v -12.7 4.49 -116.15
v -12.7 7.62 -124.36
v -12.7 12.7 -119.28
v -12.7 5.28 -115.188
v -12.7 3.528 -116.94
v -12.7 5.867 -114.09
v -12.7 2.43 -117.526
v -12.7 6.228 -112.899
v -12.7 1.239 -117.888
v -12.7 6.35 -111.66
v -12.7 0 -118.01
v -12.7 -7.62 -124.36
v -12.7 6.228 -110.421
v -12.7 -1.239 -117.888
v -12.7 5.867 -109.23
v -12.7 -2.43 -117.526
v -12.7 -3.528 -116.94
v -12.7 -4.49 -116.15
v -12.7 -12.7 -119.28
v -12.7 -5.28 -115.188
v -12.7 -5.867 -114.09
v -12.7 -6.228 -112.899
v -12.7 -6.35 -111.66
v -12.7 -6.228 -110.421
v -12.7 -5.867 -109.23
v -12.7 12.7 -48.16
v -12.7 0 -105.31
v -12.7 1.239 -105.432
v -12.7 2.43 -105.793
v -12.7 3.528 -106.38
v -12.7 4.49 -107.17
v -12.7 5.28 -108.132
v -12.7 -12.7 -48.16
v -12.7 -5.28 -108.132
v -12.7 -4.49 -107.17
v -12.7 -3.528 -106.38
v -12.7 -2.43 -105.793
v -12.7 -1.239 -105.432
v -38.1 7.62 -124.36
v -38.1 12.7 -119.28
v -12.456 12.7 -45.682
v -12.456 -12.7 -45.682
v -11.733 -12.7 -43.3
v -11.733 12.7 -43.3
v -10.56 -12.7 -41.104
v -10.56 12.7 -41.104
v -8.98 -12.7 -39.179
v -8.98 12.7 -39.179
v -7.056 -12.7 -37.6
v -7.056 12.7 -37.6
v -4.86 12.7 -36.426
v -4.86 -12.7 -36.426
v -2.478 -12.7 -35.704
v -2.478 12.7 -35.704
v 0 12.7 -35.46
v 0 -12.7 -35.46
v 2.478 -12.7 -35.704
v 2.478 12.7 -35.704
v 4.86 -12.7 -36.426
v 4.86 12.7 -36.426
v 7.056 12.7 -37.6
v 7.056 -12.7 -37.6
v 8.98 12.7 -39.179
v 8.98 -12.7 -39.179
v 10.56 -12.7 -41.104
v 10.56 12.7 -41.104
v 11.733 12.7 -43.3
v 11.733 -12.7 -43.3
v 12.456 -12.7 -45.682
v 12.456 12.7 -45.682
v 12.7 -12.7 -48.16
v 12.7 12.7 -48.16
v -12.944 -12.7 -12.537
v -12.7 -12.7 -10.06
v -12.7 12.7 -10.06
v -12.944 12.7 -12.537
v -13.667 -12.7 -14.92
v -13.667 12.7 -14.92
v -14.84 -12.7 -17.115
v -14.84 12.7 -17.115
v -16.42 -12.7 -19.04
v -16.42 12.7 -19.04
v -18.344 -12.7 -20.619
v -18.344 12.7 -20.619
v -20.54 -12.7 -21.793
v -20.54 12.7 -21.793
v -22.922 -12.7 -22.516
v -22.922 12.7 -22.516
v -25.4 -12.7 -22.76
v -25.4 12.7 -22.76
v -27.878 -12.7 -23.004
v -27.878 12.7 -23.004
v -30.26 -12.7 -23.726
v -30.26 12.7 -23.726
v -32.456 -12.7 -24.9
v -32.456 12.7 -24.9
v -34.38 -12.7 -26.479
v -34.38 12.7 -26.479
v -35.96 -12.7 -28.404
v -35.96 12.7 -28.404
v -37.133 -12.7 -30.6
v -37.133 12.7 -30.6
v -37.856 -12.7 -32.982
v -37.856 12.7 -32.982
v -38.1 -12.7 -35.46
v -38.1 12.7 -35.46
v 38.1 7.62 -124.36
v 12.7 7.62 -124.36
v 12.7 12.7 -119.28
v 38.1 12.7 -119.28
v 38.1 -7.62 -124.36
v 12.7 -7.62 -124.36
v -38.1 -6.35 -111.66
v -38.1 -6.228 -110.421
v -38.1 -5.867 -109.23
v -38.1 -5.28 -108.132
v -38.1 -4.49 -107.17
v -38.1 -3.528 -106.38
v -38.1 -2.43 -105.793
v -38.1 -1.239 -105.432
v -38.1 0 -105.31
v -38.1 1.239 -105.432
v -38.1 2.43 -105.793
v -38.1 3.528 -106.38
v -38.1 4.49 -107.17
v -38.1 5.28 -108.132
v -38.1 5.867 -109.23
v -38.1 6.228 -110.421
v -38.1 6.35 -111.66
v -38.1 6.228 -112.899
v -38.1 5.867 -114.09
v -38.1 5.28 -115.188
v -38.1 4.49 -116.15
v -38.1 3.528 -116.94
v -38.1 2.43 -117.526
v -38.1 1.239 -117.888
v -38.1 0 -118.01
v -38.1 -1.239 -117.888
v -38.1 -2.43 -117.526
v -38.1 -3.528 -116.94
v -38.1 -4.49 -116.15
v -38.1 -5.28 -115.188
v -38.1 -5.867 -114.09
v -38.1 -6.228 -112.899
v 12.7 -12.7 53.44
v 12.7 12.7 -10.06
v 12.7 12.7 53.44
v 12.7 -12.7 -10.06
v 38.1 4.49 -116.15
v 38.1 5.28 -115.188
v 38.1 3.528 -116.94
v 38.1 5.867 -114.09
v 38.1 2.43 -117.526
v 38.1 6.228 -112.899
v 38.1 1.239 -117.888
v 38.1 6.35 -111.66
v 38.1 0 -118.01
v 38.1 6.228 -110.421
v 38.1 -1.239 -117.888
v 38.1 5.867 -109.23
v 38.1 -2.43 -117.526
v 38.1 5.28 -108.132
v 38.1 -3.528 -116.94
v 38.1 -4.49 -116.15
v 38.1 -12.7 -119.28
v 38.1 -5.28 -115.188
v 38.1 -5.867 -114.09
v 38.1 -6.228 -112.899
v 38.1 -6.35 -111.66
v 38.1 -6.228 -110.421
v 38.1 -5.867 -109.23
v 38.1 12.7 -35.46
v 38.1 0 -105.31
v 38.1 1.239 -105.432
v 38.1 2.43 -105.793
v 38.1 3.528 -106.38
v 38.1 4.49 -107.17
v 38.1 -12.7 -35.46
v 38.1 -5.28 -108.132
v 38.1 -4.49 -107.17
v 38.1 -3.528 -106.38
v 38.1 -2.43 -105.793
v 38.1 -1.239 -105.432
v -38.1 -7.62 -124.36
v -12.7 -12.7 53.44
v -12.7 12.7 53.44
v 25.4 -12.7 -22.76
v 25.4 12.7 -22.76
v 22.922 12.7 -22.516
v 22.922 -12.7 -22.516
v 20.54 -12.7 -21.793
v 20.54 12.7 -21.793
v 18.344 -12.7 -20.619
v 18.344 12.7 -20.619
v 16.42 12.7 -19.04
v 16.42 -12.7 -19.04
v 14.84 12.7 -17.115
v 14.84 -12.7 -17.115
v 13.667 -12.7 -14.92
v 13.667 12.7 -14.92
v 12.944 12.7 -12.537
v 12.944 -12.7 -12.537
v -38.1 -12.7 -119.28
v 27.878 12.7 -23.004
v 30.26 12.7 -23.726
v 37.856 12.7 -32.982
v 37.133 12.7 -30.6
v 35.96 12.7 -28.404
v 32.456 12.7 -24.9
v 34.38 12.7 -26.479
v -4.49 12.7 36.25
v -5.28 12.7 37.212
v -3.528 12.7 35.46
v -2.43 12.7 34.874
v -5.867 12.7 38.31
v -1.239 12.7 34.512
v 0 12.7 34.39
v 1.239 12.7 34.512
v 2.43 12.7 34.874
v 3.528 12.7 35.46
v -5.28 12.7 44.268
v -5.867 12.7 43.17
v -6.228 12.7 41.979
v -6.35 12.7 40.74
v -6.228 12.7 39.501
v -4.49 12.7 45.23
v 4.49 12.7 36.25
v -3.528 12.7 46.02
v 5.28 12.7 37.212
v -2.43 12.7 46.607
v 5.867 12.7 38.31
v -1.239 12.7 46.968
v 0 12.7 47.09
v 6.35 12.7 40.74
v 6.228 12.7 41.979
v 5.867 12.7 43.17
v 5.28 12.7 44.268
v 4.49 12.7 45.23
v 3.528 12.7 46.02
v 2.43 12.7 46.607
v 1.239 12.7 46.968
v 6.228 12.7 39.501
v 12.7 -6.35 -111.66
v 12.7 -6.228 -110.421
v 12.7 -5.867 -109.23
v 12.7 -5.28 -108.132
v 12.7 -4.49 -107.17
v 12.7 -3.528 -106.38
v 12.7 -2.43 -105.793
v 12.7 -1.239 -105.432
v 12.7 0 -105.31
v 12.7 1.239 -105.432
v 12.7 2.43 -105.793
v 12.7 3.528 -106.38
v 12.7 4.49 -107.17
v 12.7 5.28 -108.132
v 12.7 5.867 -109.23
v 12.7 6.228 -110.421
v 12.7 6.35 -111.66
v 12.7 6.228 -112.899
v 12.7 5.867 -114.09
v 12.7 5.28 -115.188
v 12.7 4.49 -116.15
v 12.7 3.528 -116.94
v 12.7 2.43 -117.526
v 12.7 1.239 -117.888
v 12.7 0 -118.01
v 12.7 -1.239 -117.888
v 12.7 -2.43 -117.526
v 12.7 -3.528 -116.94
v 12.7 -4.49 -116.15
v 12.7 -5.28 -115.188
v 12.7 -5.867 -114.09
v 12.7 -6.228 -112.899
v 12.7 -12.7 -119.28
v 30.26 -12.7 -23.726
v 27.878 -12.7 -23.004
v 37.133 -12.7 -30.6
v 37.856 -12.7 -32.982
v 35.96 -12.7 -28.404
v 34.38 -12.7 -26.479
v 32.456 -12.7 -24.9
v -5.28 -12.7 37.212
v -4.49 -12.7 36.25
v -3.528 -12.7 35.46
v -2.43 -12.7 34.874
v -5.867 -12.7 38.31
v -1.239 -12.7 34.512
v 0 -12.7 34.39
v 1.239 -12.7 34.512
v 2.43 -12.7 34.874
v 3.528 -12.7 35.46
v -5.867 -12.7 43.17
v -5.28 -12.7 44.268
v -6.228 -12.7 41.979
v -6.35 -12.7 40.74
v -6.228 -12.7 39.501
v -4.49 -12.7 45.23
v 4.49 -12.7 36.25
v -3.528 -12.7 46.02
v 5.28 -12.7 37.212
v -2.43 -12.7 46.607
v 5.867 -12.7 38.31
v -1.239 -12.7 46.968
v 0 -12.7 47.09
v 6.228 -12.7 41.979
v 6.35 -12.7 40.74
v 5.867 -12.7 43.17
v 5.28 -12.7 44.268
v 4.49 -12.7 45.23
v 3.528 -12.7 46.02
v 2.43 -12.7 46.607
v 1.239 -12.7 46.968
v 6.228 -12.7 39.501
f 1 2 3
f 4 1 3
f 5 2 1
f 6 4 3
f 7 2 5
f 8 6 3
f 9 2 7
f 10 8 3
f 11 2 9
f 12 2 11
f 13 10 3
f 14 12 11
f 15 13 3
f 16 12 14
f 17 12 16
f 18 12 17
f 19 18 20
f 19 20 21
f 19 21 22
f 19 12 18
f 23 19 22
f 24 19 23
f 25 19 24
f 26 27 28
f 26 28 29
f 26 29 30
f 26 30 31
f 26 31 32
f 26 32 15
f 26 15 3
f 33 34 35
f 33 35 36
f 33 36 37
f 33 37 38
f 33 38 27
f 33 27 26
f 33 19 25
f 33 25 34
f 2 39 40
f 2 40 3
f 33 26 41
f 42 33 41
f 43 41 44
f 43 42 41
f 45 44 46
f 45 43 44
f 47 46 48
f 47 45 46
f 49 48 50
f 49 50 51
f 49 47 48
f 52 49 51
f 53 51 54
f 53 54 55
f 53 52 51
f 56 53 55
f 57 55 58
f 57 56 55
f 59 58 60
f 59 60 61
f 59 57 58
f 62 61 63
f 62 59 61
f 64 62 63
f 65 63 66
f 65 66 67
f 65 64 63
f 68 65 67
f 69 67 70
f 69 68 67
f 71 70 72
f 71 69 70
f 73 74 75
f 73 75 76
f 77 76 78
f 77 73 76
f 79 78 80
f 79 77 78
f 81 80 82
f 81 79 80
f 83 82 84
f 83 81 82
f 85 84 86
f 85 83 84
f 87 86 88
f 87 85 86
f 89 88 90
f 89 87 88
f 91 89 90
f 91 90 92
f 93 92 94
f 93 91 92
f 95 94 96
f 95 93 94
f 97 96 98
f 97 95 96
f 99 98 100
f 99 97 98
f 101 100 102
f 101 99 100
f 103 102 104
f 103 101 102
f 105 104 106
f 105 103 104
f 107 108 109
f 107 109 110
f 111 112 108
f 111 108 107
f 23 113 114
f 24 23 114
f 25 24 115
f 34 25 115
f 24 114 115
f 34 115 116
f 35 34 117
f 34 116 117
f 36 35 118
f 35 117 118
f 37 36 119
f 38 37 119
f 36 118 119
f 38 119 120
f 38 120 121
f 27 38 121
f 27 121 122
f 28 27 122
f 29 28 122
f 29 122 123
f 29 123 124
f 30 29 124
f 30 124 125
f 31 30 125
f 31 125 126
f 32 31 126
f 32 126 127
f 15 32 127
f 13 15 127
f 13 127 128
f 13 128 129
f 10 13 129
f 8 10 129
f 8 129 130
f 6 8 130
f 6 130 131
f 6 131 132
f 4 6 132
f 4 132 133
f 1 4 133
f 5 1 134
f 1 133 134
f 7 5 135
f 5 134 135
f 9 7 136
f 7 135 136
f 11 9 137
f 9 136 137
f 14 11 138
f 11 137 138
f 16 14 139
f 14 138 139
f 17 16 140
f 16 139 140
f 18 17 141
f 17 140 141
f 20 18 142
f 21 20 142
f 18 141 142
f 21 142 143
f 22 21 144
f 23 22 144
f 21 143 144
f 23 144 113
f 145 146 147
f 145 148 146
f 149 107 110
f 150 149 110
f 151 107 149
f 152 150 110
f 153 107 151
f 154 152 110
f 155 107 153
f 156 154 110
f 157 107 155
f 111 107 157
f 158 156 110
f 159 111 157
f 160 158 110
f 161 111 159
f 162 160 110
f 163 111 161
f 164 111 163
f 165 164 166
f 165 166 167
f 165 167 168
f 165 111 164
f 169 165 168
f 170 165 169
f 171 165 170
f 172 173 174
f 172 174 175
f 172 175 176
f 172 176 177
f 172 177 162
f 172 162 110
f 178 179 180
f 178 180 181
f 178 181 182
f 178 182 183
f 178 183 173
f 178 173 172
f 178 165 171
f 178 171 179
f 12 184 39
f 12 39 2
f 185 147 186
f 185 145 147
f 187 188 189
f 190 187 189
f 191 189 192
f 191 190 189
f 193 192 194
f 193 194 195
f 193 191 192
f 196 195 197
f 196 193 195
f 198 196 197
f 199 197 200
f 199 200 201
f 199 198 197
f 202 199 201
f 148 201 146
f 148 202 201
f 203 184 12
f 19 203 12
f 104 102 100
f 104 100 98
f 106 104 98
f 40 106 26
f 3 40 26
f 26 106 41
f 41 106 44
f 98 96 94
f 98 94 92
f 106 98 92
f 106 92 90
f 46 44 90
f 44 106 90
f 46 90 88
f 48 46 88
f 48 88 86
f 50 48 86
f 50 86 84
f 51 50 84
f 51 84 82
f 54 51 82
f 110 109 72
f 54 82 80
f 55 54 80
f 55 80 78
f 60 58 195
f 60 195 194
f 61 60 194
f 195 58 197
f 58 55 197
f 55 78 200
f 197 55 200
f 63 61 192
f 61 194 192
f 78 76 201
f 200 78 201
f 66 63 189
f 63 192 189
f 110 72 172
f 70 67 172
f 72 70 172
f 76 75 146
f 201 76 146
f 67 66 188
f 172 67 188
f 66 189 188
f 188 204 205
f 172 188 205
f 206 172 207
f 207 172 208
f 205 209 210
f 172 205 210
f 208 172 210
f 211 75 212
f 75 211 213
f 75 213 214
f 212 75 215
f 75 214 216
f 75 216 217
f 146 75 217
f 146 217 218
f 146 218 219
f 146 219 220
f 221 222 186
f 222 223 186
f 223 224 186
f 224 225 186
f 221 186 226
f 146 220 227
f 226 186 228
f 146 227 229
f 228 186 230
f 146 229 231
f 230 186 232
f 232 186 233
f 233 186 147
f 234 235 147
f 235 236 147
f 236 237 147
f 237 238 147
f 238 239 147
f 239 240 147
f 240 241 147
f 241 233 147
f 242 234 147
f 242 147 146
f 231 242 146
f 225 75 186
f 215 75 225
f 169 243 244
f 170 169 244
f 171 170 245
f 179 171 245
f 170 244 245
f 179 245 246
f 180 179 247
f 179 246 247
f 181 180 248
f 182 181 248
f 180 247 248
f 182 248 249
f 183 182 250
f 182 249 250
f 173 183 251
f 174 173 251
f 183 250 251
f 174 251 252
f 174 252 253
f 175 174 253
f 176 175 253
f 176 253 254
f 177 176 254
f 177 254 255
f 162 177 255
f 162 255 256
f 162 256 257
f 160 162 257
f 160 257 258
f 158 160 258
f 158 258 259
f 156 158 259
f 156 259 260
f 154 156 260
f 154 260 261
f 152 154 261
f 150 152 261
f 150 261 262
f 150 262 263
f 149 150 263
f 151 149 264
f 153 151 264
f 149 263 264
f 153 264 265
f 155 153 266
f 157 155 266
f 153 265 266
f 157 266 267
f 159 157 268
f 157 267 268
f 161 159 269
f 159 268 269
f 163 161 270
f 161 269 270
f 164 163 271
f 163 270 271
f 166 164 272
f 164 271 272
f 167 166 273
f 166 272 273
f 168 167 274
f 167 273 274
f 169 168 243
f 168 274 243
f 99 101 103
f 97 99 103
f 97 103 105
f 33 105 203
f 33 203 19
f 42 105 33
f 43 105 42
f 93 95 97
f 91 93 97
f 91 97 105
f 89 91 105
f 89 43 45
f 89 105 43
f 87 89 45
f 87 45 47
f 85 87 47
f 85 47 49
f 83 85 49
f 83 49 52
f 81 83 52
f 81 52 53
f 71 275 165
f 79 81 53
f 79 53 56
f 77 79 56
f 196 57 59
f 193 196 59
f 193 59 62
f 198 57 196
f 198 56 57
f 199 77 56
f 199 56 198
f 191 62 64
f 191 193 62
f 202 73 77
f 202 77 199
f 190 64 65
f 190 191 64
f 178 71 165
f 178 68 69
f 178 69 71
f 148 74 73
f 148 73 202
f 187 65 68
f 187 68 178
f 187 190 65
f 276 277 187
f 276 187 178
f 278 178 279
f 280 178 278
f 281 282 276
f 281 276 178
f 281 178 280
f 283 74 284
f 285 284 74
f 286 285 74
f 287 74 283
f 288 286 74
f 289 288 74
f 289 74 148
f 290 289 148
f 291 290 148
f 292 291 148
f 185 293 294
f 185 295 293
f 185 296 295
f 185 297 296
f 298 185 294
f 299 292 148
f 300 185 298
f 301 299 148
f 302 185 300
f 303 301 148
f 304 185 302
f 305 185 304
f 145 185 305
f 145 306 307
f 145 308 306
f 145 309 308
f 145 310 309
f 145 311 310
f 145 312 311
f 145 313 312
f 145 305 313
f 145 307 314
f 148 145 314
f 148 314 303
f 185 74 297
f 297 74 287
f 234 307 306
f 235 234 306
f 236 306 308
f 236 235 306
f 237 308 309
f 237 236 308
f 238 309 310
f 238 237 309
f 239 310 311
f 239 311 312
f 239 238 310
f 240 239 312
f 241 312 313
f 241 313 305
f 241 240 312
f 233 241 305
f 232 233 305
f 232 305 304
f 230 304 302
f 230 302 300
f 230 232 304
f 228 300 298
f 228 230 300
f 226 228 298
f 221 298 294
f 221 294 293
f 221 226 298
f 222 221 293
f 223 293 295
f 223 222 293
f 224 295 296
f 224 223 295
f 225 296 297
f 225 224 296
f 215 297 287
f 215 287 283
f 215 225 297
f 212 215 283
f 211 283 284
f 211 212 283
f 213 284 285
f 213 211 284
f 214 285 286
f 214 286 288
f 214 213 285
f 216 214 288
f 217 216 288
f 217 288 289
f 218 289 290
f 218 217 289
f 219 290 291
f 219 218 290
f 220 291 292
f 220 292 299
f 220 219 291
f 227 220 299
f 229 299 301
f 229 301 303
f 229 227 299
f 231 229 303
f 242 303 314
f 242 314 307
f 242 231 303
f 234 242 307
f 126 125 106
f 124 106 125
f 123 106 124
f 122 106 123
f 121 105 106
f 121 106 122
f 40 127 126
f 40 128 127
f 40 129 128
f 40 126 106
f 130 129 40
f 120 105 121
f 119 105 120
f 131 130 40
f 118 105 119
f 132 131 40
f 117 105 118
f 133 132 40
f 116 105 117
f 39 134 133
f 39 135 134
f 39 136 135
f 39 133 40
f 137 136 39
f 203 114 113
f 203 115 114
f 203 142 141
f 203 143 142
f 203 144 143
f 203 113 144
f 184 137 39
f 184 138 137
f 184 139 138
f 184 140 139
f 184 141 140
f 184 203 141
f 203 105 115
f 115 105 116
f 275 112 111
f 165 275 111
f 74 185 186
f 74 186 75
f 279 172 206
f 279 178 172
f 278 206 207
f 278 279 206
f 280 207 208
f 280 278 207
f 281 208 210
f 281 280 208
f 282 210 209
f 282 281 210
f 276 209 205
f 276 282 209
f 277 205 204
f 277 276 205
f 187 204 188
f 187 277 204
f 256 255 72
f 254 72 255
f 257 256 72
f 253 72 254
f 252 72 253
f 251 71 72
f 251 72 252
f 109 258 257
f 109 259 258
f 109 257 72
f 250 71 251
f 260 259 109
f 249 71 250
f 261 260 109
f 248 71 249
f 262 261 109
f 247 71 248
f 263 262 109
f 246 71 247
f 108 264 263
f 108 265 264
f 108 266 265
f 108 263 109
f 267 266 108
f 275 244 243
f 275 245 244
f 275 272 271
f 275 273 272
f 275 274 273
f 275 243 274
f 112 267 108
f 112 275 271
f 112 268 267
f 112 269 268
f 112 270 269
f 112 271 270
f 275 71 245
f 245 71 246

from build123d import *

# Parameters (mm, degrees)
F0_R     = 6.35
F1_DEPTH = 12.7
F2_R     = 6.35
F3_DEPTH = 76.2
F4_SIZE  = 5.08


with BuildPart() as f1:
    # F0 (on Front) → F1 (new body, symmetric)
    with BuildSketch(Plane.XZ):
        with BuildLine():
            Line((12.7, 53.440262), (-12.7, 53.440262))
            Line((-12.7, 53.440262), (-12.7, -10.059738))
            ThreePointArc((-12.7, -10.059738), (-16.419744, -19.039994), (-25.4, -22.759738))
            ThreePointArc((-25.4, -22.759738), (-34.380256, -26.479482), (-38.1, -35.459738))
            Line((-38.1, -35.459738), (-38.1, -124.359738))
            Line((-38.1, -124.359738), (-12.7, -124.359738))
            Line((-12.7, -124.359738), (-12.7, -48.159738))
            ThreePointArc((-12.7, -48.159738), (0, -35.459738), (12.7, -48.159738))
            Line((12.7, -48.159738), (12.7, -124.359738))
            Line((12.7, -124.359738), (38.1, -124.359738))
            Line((38.1, -124.359738), (38.1, -35.459738))
            ThreePointArc((38.1, -35.459738), (34.380256, -26.479482), (25.4, -22.759738))
            ThreePointArc((25.4, -22.759738), (16.419744, -19.039994), (12.7, -10.059738))
            Line((12.7, -10.059738), (12.7, 53.440262))
        make_face()
        with Locations((0, 40.740262)):
            Circle(F0_R, mode=Mode.SUBTRACT)
    extrude(amount=F1_DEPTH, both=True)

    # F2 (on face) → F3 (cut)
    with BuildSketch(Plane(origin=(-38.1, 0, 0), x_dir=(0, -1, 0), z_dir=(-1, 0, 0))):
        with Locations((0, -111.659738)):
            Circle(F2_R)
    extrude(amount=-F3_DEPTH, mode=Mode.SUBTRACT)

    # F4
    f4_edges = [f1.edges().sort_by_distance(p)[0] for p in [
        (-25.4, -12.7, -124.359738),
        (25.4, -12.7, -124.359738),
        (25.4, 12.7, -124.359738),
        (-25.4, 12.7, -124.359738),
    ]]
    chamfer(f4_edges, length=F4_SIZE)


solid = f1.part
